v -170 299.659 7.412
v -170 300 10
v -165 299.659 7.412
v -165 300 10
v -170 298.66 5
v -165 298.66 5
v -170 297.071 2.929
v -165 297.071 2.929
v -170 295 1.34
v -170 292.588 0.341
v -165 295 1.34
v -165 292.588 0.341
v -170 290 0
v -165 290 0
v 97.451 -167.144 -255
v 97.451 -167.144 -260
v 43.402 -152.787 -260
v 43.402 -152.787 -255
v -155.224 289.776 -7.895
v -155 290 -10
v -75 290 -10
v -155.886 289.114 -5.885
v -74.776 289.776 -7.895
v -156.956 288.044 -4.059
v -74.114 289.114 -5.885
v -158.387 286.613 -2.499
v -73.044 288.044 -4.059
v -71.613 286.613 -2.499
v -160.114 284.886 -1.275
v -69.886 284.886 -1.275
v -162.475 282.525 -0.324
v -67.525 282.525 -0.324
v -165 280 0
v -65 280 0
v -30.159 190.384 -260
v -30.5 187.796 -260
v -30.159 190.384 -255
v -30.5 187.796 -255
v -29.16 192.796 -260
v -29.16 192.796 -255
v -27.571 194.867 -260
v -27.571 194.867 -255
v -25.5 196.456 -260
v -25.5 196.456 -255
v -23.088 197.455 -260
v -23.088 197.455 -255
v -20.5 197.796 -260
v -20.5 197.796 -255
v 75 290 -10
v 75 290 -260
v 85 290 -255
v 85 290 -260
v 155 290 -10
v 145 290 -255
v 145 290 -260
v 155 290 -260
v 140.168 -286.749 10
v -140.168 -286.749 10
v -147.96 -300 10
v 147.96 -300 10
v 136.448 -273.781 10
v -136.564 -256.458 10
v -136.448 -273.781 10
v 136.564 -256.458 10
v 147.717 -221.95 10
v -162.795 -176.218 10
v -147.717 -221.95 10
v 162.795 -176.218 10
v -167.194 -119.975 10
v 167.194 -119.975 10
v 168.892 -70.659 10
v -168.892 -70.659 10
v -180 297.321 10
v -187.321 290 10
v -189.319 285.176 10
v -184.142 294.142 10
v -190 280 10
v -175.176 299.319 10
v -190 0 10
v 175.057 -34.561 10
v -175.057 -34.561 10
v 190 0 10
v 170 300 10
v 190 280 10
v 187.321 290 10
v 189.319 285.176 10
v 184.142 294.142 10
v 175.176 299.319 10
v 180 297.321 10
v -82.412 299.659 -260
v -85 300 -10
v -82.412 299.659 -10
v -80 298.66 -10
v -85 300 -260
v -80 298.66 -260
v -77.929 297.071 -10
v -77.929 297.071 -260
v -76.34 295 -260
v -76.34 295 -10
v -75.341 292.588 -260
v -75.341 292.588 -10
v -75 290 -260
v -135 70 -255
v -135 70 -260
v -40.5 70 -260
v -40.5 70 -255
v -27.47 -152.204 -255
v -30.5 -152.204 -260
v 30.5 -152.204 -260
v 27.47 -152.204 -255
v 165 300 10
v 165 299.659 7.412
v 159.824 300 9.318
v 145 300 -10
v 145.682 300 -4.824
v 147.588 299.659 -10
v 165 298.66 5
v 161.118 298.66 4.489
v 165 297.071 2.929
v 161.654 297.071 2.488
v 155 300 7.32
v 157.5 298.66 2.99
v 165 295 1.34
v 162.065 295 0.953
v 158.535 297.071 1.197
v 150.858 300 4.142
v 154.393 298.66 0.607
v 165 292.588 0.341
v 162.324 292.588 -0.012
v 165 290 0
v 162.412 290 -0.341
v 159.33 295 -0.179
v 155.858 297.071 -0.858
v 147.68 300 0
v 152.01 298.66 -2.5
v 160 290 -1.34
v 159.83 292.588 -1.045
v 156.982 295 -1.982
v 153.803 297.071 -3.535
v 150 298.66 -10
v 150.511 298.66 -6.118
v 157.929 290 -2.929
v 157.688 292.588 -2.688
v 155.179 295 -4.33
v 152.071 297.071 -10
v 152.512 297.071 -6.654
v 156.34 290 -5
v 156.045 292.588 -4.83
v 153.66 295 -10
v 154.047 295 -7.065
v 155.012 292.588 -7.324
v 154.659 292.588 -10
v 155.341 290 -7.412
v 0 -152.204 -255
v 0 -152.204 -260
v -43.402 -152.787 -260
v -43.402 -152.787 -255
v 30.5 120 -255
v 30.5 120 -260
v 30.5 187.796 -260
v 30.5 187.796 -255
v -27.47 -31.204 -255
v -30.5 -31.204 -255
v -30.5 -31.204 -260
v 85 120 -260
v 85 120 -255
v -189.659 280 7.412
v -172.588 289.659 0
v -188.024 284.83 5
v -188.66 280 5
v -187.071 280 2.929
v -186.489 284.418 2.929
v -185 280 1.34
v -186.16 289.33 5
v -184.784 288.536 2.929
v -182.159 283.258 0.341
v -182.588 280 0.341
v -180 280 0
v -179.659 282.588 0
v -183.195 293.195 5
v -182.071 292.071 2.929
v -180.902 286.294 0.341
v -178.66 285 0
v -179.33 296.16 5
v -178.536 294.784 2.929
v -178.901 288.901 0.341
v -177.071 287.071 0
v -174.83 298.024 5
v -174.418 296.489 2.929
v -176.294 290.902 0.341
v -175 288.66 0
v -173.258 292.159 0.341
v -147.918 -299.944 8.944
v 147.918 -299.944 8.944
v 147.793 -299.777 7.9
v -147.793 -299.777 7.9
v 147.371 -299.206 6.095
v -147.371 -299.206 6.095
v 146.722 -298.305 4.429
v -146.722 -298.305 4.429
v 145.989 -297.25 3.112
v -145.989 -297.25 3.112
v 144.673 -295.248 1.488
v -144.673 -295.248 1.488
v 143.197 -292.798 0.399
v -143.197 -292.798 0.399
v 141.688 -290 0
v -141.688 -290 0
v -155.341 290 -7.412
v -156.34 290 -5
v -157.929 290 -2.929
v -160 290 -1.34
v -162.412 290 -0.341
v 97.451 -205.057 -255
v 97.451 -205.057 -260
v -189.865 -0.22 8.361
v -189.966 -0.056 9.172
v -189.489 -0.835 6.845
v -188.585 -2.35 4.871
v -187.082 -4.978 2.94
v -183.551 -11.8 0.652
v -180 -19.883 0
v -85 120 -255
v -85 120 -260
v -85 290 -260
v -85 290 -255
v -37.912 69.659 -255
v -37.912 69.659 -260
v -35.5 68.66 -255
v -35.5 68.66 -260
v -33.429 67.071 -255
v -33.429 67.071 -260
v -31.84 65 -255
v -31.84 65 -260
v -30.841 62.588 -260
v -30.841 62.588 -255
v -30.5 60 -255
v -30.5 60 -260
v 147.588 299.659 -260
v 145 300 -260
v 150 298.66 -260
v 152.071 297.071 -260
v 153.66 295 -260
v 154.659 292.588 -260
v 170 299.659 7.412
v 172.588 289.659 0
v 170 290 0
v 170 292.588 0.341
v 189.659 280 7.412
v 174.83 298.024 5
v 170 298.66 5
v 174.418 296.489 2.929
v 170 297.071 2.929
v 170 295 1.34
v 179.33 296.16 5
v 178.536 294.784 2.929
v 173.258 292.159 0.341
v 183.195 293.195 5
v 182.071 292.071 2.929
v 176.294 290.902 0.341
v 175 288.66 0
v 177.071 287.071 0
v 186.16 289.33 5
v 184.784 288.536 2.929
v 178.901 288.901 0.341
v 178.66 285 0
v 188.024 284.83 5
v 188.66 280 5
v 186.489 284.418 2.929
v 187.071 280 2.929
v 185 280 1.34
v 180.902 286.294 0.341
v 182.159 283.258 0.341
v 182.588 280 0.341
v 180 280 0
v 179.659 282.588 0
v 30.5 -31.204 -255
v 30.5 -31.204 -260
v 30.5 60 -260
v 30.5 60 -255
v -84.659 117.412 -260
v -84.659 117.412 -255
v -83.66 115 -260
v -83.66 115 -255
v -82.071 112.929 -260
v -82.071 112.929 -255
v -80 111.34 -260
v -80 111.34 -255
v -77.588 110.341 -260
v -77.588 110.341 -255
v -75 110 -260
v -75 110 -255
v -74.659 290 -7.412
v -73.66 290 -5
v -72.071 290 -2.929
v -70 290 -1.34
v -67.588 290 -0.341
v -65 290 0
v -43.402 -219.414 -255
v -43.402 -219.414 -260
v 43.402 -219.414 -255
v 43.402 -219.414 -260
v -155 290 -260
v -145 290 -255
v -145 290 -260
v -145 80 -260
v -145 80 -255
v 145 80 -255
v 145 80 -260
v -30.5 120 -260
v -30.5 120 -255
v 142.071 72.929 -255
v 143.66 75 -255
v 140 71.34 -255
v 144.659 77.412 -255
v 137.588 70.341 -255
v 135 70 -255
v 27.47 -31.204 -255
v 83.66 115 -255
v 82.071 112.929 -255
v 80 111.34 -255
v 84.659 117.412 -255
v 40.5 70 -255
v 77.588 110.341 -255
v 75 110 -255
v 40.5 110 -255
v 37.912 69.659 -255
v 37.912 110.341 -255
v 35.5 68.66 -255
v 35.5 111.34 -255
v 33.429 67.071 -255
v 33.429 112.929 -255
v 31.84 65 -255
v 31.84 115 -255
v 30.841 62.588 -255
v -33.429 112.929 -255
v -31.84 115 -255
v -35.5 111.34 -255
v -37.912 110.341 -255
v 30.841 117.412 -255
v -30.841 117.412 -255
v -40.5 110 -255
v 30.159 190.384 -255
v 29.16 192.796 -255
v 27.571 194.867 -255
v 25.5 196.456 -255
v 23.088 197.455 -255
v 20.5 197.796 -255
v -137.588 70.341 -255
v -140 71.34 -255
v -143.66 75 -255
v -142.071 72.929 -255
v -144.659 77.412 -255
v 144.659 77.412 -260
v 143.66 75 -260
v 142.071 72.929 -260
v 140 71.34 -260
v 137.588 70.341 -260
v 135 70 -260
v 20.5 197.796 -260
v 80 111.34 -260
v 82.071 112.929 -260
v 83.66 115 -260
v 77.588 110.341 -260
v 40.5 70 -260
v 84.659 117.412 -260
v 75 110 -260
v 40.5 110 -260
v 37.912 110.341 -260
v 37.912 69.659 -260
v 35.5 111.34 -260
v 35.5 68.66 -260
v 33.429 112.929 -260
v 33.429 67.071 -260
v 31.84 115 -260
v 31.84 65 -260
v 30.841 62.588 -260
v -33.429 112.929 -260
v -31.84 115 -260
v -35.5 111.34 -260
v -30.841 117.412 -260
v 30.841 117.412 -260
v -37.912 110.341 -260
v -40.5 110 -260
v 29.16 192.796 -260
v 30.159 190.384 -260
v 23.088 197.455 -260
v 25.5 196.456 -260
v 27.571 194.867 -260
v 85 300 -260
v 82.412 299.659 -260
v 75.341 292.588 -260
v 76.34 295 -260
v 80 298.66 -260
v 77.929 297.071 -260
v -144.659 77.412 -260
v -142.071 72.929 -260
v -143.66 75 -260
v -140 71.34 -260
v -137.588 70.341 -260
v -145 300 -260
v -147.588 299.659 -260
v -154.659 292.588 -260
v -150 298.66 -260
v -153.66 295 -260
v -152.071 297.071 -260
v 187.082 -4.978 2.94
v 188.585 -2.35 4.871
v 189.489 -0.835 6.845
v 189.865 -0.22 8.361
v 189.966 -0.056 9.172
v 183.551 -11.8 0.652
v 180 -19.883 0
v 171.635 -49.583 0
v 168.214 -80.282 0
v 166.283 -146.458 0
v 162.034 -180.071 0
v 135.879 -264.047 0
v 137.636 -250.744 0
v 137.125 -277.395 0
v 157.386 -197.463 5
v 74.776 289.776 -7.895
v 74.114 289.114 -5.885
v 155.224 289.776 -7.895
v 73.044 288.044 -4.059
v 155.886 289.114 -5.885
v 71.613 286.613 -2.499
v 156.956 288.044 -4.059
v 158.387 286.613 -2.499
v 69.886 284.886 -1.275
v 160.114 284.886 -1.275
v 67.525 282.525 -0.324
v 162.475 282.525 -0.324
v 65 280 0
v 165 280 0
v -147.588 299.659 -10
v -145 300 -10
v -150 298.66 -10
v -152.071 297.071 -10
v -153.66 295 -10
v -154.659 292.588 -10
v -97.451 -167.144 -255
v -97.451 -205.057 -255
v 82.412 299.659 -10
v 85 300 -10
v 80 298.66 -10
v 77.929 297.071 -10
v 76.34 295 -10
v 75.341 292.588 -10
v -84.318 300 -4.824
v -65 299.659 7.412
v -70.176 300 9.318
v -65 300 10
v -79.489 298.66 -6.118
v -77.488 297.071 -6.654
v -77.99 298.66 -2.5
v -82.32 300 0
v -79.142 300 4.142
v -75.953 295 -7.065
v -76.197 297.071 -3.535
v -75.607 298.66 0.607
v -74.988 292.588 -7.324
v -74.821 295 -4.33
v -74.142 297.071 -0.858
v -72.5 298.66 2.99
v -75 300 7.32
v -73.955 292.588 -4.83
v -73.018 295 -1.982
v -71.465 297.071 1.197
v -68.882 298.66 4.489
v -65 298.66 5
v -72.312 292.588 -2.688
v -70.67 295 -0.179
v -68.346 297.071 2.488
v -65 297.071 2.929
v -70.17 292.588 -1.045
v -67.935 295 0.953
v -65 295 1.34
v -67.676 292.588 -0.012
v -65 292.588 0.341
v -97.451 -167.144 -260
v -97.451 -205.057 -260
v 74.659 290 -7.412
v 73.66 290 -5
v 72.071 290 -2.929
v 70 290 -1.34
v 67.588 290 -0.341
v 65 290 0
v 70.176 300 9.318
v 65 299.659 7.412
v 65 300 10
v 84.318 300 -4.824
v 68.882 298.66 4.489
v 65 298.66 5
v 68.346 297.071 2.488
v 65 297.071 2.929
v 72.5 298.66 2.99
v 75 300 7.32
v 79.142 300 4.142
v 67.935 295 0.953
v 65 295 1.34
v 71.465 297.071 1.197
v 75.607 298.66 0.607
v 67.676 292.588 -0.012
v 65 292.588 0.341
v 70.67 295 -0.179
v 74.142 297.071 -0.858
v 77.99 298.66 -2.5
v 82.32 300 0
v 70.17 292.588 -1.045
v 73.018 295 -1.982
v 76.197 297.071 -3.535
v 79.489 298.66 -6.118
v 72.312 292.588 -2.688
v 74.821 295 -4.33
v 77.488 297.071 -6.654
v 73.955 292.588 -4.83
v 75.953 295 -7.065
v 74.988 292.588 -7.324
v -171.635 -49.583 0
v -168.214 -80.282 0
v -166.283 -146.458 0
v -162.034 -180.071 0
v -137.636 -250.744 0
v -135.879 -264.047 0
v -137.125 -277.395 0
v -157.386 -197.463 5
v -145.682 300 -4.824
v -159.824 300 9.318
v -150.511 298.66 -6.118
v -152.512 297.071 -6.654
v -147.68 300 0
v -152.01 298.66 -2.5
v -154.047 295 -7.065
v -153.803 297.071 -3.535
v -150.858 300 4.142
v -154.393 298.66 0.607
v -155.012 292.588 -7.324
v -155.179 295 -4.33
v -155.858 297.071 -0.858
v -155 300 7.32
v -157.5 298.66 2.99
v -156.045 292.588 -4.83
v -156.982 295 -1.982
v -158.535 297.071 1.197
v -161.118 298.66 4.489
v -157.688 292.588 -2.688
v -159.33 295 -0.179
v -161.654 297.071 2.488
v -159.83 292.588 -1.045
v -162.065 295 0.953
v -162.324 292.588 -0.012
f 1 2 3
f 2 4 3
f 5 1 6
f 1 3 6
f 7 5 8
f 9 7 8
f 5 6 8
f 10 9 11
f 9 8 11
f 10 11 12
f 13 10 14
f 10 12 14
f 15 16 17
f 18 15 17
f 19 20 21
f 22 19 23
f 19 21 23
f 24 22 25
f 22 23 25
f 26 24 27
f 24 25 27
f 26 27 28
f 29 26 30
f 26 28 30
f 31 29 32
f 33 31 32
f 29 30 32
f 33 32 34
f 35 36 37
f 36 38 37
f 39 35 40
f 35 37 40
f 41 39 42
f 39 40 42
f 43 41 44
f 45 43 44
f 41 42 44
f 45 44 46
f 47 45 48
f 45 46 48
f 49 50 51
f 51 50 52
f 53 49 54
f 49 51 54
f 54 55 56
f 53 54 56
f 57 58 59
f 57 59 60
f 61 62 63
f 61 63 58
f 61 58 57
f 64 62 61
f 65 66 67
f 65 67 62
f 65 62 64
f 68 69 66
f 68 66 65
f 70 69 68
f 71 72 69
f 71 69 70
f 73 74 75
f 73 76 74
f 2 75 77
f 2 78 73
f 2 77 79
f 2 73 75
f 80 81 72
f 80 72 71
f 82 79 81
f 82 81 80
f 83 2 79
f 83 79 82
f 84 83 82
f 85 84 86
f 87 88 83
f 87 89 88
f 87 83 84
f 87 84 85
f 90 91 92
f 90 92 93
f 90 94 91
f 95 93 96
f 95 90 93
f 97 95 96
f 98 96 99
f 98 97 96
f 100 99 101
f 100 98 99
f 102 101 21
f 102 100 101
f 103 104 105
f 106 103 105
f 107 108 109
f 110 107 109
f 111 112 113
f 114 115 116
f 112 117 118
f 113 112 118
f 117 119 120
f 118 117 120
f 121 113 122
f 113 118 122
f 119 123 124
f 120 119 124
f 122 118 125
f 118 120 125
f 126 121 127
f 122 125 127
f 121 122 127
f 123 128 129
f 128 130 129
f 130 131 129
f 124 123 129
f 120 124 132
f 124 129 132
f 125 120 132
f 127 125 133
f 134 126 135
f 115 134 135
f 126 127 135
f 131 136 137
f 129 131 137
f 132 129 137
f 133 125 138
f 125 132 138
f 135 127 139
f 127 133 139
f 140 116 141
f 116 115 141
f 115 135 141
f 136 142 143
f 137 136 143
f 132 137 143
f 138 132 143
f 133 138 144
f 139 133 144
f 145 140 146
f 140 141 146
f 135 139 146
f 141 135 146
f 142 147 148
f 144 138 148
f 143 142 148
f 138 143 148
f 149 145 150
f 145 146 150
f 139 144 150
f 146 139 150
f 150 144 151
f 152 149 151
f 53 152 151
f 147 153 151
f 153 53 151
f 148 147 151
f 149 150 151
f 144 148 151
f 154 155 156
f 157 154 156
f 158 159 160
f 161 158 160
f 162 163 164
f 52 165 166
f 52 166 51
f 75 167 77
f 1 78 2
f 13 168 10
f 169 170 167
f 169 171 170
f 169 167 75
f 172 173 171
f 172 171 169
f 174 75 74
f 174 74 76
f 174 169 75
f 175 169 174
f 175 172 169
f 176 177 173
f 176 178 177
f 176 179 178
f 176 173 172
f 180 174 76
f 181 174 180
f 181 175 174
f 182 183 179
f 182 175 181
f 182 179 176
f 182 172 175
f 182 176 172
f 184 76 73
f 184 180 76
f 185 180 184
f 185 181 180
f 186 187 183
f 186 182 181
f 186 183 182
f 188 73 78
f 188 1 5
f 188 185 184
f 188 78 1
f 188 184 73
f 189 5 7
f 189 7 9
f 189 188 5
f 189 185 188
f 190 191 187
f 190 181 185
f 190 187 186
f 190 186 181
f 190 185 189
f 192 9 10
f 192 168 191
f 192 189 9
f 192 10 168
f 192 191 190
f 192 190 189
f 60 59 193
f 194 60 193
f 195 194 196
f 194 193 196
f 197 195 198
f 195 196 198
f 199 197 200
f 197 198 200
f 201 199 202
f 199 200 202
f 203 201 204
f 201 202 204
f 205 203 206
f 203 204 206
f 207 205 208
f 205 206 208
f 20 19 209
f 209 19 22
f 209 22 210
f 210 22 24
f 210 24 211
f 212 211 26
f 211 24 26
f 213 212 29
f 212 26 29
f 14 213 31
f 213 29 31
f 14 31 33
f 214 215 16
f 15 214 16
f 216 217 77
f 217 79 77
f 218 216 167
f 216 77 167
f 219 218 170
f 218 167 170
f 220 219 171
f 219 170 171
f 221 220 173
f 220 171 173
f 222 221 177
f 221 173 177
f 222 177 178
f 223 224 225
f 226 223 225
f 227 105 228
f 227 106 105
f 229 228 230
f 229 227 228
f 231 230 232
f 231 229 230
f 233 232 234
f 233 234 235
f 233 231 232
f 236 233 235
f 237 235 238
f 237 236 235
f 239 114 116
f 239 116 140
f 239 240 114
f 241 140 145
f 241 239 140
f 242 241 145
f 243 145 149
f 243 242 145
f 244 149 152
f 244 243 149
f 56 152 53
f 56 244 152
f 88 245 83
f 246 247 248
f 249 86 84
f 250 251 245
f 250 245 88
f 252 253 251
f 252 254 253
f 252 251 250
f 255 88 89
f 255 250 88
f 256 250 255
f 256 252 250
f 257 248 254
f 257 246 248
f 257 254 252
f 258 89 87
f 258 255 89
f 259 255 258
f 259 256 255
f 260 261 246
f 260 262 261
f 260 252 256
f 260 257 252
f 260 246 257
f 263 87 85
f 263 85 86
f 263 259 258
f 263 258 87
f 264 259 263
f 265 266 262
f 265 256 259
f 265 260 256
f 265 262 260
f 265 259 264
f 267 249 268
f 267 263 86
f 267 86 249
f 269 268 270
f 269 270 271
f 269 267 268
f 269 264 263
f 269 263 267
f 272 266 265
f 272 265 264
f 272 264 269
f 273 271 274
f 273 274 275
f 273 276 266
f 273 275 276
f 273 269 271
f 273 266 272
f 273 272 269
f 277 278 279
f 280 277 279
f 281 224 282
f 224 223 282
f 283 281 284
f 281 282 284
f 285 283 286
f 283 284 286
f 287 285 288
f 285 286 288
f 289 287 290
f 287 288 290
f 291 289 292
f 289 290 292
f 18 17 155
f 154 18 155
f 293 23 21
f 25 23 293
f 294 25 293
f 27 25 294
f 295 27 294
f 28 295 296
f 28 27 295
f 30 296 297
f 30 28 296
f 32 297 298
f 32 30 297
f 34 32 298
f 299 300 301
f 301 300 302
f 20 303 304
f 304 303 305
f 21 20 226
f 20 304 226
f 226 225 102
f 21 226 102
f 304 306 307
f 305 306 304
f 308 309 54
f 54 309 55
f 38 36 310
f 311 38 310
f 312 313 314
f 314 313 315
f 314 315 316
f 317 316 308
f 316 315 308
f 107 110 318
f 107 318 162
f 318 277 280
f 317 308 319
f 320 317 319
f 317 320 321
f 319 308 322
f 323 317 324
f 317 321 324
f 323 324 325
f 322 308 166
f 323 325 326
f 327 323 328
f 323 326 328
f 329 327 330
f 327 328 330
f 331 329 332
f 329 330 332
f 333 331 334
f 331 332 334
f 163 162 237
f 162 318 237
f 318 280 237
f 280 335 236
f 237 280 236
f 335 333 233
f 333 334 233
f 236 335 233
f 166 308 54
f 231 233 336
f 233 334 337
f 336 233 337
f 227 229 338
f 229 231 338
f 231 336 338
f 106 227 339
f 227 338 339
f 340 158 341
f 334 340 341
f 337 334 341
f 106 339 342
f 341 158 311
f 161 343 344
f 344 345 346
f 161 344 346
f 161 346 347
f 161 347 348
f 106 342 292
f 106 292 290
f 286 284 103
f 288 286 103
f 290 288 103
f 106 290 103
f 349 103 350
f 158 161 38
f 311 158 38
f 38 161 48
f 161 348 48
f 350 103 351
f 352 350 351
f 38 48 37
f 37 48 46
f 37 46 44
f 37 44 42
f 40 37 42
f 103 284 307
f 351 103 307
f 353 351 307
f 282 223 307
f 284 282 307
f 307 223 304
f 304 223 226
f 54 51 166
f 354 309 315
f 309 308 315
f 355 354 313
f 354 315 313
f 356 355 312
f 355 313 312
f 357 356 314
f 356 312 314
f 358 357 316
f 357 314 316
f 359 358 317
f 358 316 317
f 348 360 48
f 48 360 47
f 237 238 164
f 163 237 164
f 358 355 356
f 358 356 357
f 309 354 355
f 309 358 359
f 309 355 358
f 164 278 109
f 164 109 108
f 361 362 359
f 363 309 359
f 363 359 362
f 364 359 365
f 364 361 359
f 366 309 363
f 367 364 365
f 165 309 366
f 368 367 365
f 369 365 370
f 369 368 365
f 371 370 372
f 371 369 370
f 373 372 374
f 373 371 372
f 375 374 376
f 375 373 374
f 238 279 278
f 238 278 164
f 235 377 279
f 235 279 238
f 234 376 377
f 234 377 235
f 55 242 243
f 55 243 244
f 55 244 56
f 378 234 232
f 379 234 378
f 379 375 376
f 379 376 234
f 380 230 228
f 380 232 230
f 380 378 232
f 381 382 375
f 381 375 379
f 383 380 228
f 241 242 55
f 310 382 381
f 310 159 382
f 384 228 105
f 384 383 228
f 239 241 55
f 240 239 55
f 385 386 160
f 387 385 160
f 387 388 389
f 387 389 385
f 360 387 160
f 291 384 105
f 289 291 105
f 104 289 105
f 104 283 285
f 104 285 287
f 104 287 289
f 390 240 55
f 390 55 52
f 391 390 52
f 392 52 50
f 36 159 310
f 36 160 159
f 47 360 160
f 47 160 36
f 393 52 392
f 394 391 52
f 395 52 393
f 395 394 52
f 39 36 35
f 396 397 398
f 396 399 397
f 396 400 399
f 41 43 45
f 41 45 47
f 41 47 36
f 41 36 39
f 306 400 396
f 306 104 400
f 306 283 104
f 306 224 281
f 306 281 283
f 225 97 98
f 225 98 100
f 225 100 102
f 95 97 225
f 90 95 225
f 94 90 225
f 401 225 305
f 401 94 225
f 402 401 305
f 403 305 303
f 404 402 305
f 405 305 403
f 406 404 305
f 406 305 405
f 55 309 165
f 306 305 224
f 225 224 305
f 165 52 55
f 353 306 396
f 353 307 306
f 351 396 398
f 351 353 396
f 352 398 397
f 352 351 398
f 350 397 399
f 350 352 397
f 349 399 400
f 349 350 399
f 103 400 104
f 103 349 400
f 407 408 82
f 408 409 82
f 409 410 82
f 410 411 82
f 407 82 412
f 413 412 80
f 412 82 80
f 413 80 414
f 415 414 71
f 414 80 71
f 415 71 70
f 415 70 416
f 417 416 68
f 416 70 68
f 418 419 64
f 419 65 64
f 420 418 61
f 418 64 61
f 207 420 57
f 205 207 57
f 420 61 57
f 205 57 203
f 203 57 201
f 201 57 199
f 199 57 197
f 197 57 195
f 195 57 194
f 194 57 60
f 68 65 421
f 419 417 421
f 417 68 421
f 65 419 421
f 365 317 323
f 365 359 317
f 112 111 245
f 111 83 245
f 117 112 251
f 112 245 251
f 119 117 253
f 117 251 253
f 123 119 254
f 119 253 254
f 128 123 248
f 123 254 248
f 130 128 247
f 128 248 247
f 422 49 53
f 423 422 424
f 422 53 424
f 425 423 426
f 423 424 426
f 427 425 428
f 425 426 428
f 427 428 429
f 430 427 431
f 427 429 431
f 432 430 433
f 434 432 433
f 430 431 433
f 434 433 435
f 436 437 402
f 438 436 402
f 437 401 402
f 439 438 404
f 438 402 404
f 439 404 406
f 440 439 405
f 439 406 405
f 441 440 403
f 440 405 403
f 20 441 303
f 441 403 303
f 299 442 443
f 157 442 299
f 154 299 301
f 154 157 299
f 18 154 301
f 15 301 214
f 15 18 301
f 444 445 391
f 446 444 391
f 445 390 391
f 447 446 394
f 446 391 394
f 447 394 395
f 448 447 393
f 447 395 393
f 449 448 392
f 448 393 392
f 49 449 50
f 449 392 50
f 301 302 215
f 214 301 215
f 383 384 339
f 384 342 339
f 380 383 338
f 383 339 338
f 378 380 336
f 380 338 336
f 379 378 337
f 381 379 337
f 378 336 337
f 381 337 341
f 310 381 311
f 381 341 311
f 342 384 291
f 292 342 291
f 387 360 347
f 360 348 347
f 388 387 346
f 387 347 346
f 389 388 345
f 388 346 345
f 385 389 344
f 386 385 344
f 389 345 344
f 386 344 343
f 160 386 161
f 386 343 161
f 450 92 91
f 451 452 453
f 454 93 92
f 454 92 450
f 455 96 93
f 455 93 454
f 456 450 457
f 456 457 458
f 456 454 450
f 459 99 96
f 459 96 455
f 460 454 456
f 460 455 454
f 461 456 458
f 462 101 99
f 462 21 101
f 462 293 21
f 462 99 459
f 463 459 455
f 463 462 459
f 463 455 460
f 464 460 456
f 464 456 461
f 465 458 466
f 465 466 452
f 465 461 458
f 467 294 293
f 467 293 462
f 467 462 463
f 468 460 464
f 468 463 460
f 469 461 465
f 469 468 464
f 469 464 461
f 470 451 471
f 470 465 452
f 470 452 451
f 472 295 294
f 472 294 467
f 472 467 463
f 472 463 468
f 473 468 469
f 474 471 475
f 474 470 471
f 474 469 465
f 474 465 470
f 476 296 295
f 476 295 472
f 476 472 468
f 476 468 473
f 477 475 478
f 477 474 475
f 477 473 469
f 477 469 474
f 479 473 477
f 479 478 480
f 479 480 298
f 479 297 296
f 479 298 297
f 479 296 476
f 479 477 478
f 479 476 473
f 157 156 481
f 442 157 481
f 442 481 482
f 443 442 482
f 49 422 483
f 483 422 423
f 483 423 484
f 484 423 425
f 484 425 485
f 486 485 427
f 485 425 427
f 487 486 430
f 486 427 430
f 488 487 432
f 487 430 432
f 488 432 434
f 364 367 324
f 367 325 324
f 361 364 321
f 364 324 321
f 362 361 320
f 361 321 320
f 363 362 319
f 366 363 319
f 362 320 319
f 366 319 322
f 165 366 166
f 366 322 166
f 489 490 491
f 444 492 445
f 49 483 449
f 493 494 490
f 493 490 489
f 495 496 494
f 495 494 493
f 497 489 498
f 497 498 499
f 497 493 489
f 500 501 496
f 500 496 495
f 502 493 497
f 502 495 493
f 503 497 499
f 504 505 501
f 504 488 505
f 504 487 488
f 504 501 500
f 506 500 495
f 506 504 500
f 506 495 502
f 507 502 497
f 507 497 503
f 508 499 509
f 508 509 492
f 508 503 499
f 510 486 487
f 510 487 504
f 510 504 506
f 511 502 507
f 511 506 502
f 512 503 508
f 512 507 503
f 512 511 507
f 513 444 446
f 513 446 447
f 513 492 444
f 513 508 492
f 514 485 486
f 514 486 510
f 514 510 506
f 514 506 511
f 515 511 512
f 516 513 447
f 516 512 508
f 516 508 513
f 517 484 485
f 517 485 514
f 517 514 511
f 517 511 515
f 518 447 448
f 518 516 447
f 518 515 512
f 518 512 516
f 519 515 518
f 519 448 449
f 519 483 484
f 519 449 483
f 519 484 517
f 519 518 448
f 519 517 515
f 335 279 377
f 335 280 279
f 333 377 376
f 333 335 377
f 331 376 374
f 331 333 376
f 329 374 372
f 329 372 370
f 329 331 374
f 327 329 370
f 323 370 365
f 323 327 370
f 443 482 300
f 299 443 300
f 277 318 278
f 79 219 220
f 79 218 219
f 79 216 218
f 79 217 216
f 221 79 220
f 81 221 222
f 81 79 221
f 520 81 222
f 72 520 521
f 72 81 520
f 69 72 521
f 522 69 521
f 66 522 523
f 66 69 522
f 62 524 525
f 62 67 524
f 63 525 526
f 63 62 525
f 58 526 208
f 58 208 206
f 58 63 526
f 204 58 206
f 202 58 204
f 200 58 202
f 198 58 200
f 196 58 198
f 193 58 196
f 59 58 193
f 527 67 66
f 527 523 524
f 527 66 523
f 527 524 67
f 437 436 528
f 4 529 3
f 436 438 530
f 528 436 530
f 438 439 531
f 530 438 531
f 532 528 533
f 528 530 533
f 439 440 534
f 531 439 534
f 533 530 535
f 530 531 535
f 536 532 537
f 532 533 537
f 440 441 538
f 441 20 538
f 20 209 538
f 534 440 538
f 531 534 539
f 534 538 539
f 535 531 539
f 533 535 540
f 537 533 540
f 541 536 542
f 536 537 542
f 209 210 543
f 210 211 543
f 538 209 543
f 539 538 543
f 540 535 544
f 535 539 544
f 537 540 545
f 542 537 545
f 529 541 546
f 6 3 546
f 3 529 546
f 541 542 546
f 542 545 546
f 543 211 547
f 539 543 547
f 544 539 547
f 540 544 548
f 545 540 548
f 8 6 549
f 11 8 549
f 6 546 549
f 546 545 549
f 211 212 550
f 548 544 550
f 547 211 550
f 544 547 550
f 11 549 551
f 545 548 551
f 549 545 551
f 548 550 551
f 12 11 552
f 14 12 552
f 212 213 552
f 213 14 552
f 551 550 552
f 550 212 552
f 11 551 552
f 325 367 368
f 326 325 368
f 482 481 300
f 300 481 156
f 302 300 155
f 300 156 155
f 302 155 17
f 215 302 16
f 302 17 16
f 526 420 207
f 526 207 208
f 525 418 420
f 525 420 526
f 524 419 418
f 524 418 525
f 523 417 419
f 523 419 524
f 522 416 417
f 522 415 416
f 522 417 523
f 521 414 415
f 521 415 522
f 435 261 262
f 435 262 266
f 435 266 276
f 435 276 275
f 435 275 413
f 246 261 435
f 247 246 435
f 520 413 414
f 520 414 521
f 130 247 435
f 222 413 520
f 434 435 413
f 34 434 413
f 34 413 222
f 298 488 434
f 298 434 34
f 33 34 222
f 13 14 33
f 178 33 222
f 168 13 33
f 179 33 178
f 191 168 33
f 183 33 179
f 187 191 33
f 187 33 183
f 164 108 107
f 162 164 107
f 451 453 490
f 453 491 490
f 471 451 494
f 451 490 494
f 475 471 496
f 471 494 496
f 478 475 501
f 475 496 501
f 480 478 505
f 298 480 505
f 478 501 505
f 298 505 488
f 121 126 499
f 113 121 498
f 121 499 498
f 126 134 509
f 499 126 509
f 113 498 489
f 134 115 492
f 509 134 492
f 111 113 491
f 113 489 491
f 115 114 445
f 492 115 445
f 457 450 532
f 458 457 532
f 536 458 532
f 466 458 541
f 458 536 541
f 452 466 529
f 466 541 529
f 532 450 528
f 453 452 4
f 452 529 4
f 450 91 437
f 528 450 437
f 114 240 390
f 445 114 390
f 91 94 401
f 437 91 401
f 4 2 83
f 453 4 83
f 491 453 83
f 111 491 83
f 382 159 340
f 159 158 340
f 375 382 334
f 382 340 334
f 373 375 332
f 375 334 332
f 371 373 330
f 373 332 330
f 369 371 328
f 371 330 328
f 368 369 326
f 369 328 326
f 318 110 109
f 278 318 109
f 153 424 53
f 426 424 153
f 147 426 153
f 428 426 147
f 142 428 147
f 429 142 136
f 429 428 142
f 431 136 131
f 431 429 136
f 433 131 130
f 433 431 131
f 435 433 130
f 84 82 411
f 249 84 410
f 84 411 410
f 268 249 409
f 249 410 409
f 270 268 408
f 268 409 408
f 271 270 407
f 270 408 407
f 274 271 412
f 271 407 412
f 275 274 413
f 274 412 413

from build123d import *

# Parameters (mm, degrees)
BOSS_EXTRU_1_DEPTH      = 10
ESQUISSE2_W             = 80
ESQUISSE2_H             = 270
BOSS_EXTRU_2_DEPTH      = 10
CONG_1_R                = 10
ENL_V_MAT_EXTRU_1_DEPTH = 447.094160464
ESQUISSE5_W             = 60
ESQUISSE5_H             = 230
BOSS_EXTRU_3_DEPTH      = 5
BOSS_EXTRU_4_DEPTH      = 5
CONG_2_R                = 10
ENL_V_MAT_EXTRU_4_DEPTH = 121
BOSS_EXTRU_5_DEPTH      = 5


with BuildPart() as part:
    # Esquisse1 → Boss.-Extru.1 (new body)
    with BuildSketch(Plane.XY):
        with BuildLine():
            Line((-170, 300), (170, 300))
            ThreePointArc((170, 300), (184.142135624, 294.142135624), (190, 280))
            Line((190, 280), (190, -280))
            ThreePointArc((190, -280), (184.142135624, -294.142135624), (170, -300))
            Line((170, -300), (-170, -300))
            ThreePointArc((-170, -300), (-184.142135624, -294.142135624), (-190, -280))
            Line((-190, -280), (-190, 280))
            ThreePointArc((-190, 280), (-184.142135624, 294.142135624), (-170, 300))
        make_face()
    extrude(amount=BOSS_EXTRU_1_DEPTH)

    # Esquisse2 → Boss.-Extru.2 (add)
    with BuildSketch(Plane(origin=(0, 300, 0), x_dir=(1, 0, 0), z_dir=(0, 1, 0))):
        with Locations((-115, 125)):
            Rectangle(ESQUISSE2_W, ESQUISSE2_H)
        with Locations((115, 125)):
            Rectangle(ESQUISSE2_W, ESQUISSE2_H)
    extrude(amount=-BOSS_EXTRU_2_DEPTH)

    # Congé1
    cong_1_edges = [part.edges().sort_by_distance(p)[0] for p in [
        (-155, 300, -130),
        (-162.5, 300, 0),
        (-184.142135624, 294.142135624, 0),
        (-190, 0, 0),
        (-184.142135624, -294.142135624, 0),
        (0, -300, 0),
        (184.142135624, -294.142135624, 0),
        (190, 0, 0),
        (-75, 300, -130),
        (184.142135624, 294.142135624, 0),
        (0, 300, 0),
        (162.5, 300, 0),
        (75, 300, -130),
        (155, 300, -130),
        (115, 290, 0),
        (-115, 290, 0),
        (-155, 295, 0),
        (155, 295, 0),
        (-75, 295, 0),
        (75, 295, 0),
    ]]
    fillet(cong_1_edges, radius=CONG_1_R - 0.0001)  # a hair under: the kernel refuses the full size

    # Esquisse4 → Enlèv. mat.-Extru.1 (cut, through all)
    with BuildSketch(Plane.XY.offset(10)):
        with BuildLine():
            add(Edge.make_bspline(
                [(-190, 0), (-152.341984932, -61.029808148), (-192.805633878, -171.738289178), (-120.934262628, -264.028864274), (-147.959572806, -300)],
                knots=[0, 0, 0, 0, 0.651486156, 1, 1, 1, 1], degree=3))
            Line((-190, 0), (-190, -280))
            ThreePointArc((-190, -280), (-184.142135624, -294.142135624), (-170, -300))
            Line((-170, -300), (-147.959572806, -300))
        make_face()
        with BuildLine():
            add(Edge.make_bspline(
                [(190, 0), (152.341984932, -61.029808148), (192.805633878, -171.738289178), (120.934262628, -264.028864274), (147.959572806, -300)],
                knots=[0, 0, 0, 0, 0.651486156, 1, 1, 1, 1], degree=3))
            Line((147.959572806, -300), (170, -300))
            ThreePointArc((170, -300), (184.142135624, -294.142135624), (190, -280))
            Line((190, -280), (190, 0))
        make_face()
    extrude(amount=-ENL_V_MAT_EXTRU_1_DEPTH, mode=Mode.SUBTRACT)

    # Esquisse5 → Boss.-Extru.3 (add)
    with BuildSketch(Plane(origin=(0, 0, -260), x_dir=(-1, 0, 0), z_dir=(0, 0, -1))):
        with Locations((-115, 185)):
            Rectangle(ESQUISSE5_W, ESQUISSE5_H)
        with Locations((115, 185)):
            Rectangle(ESQUISSE5_W, ESQUISSE5_H)
    extrude(amount=-BOSS_EXTRU_3_DEPTH)

    # Esquisse6 → Boss.-Extru.4 (add)
    with BuildSketch(Plane(origin=(0, 0, -260), x_dir=(-1, 0, 0), z_dir=(0, 0, -1))):
        Polygon((-145, 110), (-30.5, 110), (-30.5, 197.79553311), (30.5, 197.79553311), (30.5, 110), (145, 110), (145, 70), (30.5, 70), (30.5, -152.20446689), (-30.5, -152.20446689), (-30.5, 70), (-145, 70), align=None)
    extrude(amount=-BOSS_EXTRU_4_DEPTH)

    # Congé2
    cong_2_edges = [part.edges().sort_by_distance(p)[0] for p in [
        (145, 70, -257.5),
        (-145, 70, -257.5),
        (85, 110, -257.5),
        (30.5, 110, -257.5),
        (30.5, 197.79553311, -257.5),
        (-30.5, 197.79553311, -257.5),
        (-85, 110, -257.5),
        (-30.5, 110, -257.5),
        (-30.5, 70, -257.5),
        (30.5, 70, -257.5),
    ]]
    fillet(cong_2_edges, radius=CONG_2_R)

    # Esquisse8 → Enlèv. mat.-Extru.4 (cut)
    with BuildSketch(Plane.XZ.offset(152.20446689)):
        Polygon((-27.46969697, -255), (-30.5, -255), (-30.5, -260), align=None)
        Polygon((30.5, -255), (27.46969697, -255), (30.5, -260), align=None)
    extrude(amount=-ENL_V_MAT_EXTRU_4_DEPTH, mode=Mode.SUBTRACT)


with BuildPart() as body_2:
    # Esquisse9 → Boss.-Extru.5 (new body)
    with BuildSketch(Plane(origin=(0, 0, -260), x_dir=(-1, 0, 0), z_dir=(0, 0, -1))):
        Polygon((-43.402081378, -152.787150642), (0, -152.20446689), (43.402081378, -152.787150642), (97.45133517, -167.14398368), (97.45133517, -205.056801371), (43.402081378, -219.413634409), (-43.402081378, -219.413634409), (-97.45133517, -205.056801371), (-97.45133517, -167.14398368), align=None)
    extrude(amount=-BOSS_EXTRU_5_DEPTH)


solid = Compound([part.part, body_2.part])
